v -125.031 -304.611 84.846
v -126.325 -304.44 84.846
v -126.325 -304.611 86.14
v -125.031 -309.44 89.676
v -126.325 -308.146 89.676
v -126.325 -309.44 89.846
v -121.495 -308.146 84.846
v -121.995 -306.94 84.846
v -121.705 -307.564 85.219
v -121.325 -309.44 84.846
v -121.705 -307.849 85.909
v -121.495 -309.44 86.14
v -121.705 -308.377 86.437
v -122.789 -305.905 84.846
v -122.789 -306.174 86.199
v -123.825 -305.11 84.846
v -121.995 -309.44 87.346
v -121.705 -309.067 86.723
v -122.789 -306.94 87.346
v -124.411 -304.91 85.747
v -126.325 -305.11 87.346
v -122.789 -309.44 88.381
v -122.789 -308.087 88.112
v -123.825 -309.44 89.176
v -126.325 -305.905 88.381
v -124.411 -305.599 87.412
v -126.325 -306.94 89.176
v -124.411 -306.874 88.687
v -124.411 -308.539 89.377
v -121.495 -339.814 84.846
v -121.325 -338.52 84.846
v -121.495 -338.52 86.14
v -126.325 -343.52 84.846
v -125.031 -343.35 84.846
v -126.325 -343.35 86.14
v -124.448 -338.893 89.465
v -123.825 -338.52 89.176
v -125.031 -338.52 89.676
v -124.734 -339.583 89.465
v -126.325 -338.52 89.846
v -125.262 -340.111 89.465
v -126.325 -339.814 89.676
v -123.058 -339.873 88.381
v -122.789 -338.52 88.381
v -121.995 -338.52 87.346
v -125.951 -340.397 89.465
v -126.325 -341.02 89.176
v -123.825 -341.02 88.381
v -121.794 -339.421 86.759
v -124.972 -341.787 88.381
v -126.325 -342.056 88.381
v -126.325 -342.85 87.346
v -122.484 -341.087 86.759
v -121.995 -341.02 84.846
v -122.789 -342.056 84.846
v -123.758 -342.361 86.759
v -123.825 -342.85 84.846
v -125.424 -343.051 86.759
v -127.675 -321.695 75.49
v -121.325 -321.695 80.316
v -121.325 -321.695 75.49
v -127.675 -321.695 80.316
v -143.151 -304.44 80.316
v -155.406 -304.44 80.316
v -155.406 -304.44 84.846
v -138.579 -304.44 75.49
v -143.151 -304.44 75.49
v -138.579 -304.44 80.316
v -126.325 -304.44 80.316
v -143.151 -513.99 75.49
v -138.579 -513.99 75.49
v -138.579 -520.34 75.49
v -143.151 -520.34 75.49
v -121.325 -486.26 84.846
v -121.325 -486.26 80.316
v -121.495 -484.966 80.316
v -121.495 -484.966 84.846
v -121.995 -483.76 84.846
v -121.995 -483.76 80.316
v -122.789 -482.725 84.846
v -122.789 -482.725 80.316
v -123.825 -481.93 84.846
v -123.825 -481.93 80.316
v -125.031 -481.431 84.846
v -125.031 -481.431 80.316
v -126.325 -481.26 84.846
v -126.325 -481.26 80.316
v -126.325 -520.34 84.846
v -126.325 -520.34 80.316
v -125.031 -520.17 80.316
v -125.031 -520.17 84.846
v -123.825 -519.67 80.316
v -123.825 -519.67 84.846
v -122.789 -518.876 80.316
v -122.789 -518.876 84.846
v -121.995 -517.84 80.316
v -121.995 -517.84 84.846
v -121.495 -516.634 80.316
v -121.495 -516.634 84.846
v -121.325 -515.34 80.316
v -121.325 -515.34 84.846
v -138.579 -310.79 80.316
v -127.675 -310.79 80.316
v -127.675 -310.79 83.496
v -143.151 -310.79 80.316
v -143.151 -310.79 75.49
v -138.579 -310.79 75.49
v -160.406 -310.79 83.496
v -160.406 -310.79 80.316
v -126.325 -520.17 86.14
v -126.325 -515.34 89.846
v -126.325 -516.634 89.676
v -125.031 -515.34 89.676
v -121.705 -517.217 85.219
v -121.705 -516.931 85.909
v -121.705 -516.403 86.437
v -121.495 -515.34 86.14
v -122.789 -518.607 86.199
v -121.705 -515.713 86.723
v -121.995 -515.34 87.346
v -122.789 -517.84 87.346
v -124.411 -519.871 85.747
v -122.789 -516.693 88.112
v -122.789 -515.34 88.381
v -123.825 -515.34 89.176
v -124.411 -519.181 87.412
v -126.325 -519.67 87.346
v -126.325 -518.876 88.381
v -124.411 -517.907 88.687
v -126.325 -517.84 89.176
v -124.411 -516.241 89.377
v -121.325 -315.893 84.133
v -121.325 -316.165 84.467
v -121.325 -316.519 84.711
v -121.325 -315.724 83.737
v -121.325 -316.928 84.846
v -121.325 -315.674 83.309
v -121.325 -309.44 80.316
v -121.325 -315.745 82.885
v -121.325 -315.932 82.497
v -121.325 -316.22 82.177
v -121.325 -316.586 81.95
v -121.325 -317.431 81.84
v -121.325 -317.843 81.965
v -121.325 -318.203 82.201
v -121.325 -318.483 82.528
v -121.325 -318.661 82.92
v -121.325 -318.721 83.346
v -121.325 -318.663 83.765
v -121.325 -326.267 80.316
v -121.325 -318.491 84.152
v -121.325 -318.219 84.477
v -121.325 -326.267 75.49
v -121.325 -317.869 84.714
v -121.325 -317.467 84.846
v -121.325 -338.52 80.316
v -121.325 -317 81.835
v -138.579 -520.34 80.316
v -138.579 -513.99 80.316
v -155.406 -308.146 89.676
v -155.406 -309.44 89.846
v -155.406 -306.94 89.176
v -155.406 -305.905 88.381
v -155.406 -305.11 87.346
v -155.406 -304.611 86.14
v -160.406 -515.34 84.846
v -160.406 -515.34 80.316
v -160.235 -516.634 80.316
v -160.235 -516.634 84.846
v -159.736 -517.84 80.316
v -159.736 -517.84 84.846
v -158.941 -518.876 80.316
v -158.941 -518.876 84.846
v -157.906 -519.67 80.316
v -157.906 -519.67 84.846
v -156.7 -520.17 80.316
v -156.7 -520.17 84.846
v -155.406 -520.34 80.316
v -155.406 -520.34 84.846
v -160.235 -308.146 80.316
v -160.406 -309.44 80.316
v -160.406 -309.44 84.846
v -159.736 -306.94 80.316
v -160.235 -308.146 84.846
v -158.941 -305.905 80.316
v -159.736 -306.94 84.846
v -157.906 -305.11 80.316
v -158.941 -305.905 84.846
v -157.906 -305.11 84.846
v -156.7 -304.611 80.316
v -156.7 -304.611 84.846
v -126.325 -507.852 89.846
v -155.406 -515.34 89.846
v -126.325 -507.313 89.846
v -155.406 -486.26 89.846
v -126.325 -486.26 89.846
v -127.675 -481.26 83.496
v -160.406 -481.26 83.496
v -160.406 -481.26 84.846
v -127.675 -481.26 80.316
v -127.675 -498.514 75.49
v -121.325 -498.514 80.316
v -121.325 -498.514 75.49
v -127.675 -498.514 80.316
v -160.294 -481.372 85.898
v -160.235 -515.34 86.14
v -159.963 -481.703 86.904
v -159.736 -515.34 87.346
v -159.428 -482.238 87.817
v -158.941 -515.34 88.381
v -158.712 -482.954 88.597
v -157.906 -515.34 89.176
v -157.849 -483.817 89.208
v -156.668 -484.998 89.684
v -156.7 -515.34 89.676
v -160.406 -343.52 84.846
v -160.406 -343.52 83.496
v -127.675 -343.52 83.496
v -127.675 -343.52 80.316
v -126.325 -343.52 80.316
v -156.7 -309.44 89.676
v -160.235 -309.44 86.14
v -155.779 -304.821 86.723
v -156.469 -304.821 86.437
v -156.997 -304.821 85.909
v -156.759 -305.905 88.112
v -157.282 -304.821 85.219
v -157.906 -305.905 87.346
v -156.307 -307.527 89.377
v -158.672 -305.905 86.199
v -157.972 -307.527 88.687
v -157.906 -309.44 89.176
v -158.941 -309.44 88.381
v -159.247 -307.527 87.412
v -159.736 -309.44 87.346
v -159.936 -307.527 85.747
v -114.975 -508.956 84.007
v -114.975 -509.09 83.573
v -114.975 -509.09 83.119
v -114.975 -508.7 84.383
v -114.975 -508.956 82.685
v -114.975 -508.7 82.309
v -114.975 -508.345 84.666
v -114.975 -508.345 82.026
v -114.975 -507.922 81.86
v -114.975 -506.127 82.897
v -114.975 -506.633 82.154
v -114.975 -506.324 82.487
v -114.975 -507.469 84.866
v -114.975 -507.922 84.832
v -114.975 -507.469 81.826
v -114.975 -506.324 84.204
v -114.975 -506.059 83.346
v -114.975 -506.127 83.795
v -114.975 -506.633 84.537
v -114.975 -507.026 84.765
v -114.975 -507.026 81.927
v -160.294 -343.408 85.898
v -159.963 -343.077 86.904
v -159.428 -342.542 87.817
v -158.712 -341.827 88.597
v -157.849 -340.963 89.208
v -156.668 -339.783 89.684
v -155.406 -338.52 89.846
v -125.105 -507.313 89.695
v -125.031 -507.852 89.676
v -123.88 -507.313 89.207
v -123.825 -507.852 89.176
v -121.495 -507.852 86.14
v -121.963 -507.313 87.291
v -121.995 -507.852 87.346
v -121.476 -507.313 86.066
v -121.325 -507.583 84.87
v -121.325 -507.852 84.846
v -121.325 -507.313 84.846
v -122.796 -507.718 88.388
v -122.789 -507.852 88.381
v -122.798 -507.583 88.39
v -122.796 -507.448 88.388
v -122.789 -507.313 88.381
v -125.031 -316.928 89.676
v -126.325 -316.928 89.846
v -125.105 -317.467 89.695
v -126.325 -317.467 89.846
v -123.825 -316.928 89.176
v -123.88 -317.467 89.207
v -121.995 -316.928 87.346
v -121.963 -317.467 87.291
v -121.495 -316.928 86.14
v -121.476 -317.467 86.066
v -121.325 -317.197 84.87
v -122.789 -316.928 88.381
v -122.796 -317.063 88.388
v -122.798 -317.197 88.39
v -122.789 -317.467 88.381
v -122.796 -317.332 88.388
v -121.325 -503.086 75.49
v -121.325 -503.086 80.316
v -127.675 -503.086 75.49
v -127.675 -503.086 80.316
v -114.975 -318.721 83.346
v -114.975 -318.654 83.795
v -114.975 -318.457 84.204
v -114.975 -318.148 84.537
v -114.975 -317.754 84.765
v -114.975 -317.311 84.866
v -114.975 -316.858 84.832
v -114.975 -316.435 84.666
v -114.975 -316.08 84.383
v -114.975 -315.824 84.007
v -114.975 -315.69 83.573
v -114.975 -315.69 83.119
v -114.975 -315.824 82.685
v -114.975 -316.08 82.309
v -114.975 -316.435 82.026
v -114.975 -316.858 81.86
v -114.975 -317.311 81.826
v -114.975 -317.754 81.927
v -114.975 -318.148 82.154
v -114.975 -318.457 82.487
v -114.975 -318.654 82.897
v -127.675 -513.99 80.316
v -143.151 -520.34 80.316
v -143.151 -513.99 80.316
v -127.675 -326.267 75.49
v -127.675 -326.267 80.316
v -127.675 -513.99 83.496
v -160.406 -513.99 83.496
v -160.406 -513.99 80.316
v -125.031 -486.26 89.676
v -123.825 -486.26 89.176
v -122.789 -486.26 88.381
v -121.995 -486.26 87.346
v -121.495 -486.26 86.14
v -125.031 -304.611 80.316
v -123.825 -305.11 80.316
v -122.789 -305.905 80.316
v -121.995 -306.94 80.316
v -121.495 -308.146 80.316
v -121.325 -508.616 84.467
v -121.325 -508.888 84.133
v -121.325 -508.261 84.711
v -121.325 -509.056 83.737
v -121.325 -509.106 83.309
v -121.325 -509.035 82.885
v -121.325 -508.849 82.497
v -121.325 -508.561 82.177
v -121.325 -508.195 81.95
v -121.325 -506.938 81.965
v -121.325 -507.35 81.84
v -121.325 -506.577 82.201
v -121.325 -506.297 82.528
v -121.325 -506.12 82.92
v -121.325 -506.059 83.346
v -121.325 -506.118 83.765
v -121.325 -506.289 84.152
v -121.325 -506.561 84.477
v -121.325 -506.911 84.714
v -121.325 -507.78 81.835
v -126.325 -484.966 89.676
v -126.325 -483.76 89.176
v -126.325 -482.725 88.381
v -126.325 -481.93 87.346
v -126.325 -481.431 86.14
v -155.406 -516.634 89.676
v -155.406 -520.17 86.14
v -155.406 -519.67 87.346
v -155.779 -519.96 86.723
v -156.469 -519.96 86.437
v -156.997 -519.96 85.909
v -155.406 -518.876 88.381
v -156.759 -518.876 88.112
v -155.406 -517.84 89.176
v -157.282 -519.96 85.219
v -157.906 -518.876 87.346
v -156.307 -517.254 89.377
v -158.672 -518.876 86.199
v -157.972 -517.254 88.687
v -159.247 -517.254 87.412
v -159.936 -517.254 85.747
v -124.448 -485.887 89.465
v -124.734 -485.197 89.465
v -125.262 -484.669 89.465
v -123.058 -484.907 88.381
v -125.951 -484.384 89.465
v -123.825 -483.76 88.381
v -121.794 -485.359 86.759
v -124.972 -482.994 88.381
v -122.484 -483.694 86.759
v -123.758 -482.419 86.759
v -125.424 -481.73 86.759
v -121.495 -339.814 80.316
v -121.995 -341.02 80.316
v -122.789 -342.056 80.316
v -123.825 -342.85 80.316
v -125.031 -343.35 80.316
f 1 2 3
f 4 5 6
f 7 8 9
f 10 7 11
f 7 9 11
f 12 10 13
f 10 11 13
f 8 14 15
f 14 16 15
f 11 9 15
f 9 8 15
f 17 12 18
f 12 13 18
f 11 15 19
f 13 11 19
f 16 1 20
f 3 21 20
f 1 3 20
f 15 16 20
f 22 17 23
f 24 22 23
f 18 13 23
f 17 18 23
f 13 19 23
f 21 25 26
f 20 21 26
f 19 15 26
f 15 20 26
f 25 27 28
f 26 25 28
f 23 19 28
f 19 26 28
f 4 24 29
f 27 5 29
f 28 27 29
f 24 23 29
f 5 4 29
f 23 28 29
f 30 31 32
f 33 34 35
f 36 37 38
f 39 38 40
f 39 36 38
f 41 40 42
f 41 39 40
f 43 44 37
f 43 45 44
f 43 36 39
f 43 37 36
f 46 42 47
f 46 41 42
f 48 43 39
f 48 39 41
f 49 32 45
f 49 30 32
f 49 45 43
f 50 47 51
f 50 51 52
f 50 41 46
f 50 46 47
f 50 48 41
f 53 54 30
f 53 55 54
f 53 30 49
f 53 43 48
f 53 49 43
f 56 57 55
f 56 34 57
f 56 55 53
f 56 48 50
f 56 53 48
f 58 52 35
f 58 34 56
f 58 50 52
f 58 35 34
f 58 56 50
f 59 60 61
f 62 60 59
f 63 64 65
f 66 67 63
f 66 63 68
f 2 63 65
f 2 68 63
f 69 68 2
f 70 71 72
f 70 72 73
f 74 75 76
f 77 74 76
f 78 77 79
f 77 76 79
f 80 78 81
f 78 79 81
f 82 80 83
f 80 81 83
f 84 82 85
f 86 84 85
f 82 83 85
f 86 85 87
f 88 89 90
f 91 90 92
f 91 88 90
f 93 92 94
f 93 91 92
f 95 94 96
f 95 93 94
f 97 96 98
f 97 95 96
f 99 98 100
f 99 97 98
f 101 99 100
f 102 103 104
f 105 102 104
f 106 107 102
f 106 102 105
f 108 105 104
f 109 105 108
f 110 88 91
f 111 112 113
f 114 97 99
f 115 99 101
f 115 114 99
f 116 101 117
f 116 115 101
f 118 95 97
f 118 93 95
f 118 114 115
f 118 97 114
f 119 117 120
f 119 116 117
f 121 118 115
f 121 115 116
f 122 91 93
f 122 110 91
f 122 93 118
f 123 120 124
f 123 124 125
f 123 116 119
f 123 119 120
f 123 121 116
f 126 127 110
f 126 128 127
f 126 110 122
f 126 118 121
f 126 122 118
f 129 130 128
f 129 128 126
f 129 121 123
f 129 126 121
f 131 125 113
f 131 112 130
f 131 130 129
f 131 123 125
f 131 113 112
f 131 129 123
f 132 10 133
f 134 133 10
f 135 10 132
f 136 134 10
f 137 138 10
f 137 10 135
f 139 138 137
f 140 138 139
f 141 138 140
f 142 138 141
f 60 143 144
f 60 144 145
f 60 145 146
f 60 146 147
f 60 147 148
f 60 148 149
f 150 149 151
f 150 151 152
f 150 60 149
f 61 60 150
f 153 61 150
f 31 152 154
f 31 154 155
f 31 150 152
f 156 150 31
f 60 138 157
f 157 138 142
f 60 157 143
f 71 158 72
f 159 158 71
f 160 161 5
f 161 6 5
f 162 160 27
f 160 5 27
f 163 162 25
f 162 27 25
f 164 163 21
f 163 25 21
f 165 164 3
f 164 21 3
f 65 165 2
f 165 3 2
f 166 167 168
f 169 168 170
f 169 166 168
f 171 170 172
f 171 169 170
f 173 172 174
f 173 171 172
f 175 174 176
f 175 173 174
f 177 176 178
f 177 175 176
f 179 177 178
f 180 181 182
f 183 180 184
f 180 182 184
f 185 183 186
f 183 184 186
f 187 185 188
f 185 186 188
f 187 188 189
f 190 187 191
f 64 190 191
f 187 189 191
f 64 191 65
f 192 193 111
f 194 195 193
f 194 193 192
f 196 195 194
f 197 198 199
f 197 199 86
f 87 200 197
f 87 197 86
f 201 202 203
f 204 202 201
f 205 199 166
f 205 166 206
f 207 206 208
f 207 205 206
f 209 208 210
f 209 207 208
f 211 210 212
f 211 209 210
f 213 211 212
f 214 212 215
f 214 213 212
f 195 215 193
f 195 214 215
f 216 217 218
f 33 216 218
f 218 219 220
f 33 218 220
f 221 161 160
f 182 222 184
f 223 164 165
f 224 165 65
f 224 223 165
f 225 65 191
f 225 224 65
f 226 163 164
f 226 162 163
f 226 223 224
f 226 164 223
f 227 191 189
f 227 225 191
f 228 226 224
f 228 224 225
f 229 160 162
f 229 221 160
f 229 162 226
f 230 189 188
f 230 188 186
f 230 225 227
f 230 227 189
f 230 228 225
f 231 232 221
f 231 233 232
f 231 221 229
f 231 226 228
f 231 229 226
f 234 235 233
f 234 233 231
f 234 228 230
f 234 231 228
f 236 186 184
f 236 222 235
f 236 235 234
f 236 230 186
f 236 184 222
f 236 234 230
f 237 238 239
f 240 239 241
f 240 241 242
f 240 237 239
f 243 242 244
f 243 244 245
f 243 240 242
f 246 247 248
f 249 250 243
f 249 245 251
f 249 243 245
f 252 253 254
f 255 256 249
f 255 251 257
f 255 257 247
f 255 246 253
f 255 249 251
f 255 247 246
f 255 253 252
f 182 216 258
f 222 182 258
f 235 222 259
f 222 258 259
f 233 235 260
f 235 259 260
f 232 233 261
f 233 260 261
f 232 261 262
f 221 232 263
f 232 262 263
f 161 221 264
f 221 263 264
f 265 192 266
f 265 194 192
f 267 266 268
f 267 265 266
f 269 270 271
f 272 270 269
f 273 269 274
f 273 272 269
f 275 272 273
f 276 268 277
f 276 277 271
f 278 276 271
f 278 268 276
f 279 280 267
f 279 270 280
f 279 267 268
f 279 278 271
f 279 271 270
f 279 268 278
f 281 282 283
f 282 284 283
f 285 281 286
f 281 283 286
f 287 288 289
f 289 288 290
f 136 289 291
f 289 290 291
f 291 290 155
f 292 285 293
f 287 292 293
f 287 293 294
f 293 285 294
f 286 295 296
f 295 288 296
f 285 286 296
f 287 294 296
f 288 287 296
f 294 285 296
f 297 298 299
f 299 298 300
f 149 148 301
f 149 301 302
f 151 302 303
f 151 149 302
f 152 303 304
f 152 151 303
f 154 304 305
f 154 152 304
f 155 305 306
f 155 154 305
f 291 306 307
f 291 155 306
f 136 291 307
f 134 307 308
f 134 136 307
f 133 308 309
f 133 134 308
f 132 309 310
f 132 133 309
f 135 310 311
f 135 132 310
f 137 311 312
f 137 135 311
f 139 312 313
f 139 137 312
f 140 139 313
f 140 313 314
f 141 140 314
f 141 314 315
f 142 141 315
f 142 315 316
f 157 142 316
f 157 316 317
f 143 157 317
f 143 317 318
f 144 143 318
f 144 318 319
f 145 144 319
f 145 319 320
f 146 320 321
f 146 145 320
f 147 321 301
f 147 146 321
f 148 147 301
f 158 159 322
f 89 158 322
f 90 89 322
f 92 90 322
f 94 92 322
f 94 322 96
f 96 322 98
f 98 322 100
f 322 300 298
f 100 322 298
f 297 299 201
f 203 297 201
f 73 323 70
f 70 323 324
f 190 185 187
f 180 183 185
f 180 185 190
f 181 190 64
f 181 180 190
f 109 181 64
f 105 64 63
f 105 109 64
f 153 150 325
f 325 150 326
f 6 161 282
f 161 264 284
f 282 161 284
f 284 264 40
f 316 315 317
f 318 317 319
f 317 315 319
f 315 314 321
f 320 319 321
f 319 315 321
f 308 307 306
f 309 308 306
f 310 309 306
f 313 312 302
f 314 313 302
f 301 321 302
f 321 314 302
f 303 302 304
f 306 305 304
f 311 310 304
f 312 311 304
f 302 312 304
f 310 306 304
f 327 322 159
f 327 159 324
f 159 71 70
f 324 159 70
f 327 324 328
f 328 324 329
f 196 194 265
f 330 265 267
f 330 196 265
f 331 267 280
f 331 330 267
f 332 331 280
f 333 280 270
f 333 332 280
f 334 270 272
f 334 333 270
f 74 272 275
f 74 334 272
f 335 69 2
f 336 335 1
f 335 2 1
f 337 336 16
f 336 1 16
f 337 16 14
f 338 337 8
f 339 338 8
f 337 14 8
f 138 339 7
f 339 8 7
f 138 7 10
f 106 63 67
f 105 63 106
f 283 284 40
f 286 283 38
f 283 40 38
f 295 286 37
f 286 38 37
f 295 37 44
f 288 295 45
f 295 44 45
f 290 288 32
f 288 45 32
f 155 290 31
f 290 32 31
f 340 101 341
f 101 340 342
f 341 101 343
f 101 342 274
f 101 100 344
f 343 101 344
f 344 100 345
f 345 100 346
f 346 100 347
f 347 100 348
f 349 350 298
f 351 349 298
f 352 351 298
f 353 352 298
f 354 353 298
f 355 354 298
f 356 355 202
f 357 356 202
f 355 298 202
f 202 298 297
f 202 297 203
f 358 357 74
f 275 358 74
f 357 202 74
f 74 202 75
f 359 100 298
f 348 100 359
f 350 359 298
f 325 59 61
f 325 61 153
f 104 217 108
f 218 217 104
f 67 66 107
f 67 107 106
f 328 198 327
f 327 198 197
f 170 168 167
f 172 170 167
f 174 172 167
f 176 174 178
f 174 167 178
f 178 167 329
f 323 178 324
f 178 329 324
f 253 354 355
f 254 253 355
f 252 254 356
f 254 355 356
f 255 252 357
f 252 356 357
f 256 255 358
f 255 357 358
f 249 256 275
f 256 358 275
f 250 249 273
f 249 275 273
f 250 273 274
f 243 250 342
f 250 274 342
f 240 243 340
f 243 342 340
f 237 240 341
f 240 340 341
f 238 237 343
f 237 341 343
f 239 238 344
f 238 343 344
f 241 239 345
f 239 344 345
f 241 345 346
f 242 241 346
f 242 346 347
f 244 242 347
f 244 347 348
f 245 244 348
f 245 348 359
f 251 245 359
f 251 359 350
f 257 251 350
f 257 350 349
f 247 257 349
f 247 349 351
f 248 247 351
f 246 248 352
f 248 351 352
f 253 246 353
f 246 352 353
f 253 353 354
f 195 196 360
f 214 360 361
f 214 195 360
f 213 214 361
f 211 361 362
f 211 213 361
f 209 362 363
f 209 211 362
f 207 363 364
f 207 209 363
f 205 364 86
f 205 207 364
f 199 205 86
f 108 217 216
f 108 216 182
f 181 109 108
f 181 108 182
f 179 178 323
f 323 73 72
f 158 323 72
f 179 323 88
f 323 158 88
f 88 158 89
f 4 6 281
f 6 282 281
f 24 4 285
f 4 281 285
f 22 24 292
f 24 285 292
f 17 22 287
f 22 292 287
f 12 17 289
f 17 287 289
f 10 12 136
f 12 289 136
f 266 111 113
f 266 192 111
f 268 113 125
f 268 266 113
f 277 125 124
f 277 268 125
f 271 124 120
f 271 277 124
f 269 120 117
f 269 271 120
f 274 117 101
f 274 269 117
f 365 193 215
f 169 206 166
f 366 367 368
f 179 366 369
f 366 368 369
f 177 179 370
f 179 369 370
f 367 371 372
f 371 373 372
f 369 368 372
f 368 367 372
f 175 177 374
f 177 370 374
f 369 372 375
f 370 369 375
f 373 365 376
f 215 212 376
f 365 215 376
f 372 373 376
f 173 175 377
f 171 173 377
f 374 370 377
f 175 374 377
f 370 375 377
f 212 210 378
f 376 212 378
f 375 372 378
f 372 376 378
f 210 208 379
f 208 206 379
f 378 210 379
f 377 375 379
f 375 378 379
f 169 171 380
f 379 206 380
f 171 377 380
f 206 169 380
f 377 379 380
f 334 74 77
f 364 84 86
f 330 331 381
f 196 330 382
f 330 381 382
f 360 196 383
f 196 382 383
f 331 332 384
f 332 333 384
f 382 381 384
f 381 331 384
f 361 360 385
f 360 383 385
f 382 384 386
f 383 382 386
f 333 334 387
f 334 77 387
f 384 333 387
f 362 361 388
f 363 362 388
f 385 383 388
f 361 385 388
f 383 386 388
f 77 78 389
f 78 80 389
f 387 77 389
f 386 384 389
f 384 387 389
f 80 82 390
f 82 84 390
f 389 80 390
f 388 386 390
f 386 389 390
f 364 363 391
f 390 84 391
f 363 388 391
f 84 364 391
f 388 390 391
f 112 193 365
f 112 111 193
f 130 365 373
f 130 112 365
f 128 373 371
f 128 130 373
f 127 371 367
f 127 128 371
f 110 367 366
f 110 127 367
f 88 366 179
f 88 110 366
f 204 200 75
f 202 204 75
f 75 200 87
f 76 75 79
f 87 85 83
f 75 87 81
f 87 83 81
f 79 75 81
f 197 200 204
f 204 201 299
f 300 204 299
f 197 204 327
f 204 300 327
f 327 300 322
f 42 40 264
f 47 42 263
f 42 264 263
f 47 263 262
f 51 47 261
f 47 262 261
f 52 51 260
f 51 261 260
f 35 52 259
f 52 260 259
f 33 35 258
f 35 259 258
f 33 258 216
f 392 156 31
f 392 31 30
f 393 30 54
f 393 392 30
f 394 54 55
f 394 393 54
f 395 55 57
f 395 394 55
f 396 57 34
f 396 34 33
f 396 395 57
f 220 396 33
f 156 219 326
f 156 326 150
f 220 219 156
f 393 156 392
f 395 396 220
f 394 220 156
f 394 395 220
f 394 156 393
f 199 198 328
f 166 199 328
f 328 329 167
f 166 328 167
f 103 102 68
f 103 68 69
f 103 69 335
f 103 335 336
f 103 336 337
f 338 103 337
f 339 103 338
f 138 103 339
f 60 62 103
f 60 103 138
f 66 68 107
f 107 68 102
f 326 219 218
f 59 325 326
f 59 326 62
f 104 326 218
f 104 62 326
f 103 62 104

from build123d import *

# Parameters (mm, degrees)
SKETCH6_W              = 32.730904613
SKETCH6_H              = 32.73
LID_EXTRUSION_DEPTH    = 6.35
LEG_EXTRUSION_DEPTH    = 9.53
SKETCH8_W              = 4.572
SKETCH8_H              = 6.35
LOCKING_PIN_DEPTH      = 4.826
SKETCH9_R              = 1.524
LOCKING_CYLINDER_DEPTH = 6.35
FILLET2_R              = 5
FILLET3_R              = 5


# Read off the part's stored shape, not the designer's step: Leg Extrusion
with BuildPart() as part:
    # Sketch6 → Lid Extrusion (new body)
    with BuildSketch(Plane.XY.offset(83.495959084)):
        with Locations((-144.040218944, -497.625165889)):
            Rectangle(SKETCH6_W, SKETCH6_H)
    extrude(amount=LID_EXTRUSION_DEPTH)

    # Leg Extrusion outline → Leg Extrusion (add)
    with BuildSketch(Plane.XY.offset(80.315959084)):
        with BuildLine():
            Line((-160.405671251, -513.990165889), (-160.405671251, -520.340165889))
            Line((-160.405671251, -520.340165889), (-121.324766638, -520.340165889))
            Line((-121.324766638, -520.340165889), (-121.324766638, -486.260165889))
            ThreePointArc((-121.324766638, -486.260165889), (-122.789232732, -482.724631983), (-126.324766638, -481.260165889))
            Line((-126.324766638, -481.260165889), (-127.674766638, -481.260165889))
            Line((-127.674766638, -481.260165889), (-127.674766638, -513.990165889))
            Line((-127.674766638, -513.990165889), (-160.405671251, -513.990165889))
        make_face()
    extrude(amount=LEG_EXTRUSION_DEPTH)

    # Sketch8 → Locking Pin (add)
    with BuildSketch(Plane(origin=(0, 0, 80.315959084), x_dir=(-1, 0, 0), z_dir=(0, 0, -1))):
        with Locations((140.865218944, -517.165165889)):
            Rectangle(SKETCH8_W, SKETCH8_H)
    locking_pin = extrude(amount=LOCKING_PIN_DEPTH)

    # Sketch9 → Locking cylinder (add)
    with BuildSketch(Plane(origin=(-121.324766638, 0, 0), x_dir=(0, 0, -1), z_dir=(1, 0, 0))):
        with Locations(Location((-83.345959084, -507.582855381, 0), (0, 0, 90))):
            Circle(SKETCH9_R)
    extrude(amount=LOCKING_CYLINDER_DEPTH)

    # locking pin mirror: Locking Pin across plane
    add(locking_pin.mirror(Plane(origin=(-320.832466263, -320.832466263, 0), x_dir=(0, 0, 1), z_dir=(-0.7071067811865475, -0.7071067811865477, 0))))


with BuildPart() as body_2:
    # Top mirror: mirrored copy
    add(part.part.mirror(Plane(origin=(0, -412.390165889, 0), x_dir=(0, 0, 1), z_dir=(0, -1, 0))))

    # Fillet2
    fillet2_edges = [body_2.edges().sort_by_distance(p)[0] for p in [
        (-160.405671251, -327.155165889, 89.845959084),
        (-140.865218944, -304.440165889, 89.845959084),
        (-160.405671251, -304.440165889, 85.080959084),
        (-121.324766638, -304.440165889, 85.080959084),
        (-122.789232732, -342.055699795, 89.845959084),
        (-144.040218944, -343.520165889, 89.845959084),
        (-121.324766638, -321.480165889, 89.845959084),
    ]]
    fillet(fillet2_edges, radius=FILLET2_R)


with BuildPart() as part_1:
    add(part.part)

    # Fillet3
    fillet3_edges = [part_1.edges().sort_by_distance(p)[0] for p in [
        (-160.405671251, -497.625165889, 89.845959084),
        (-140.865218944, -520.340165889, 89.845959084),
        (-160.405671251, -520.340165889, 85.080959084),
        (-121.324766638, -520.340165889, 85.080959084),
        (-122.789232732, -482.724631983, 89.845959084),
        (-144.040218944, -481.260165889, 89.845959084),
        (-121.324766638, -503.300165889, 89.845959084),
    ]]
    fillet(fillet3_edges, radius=FILLET3_R)


solid = Compound([body_2.part, part_1.part])
